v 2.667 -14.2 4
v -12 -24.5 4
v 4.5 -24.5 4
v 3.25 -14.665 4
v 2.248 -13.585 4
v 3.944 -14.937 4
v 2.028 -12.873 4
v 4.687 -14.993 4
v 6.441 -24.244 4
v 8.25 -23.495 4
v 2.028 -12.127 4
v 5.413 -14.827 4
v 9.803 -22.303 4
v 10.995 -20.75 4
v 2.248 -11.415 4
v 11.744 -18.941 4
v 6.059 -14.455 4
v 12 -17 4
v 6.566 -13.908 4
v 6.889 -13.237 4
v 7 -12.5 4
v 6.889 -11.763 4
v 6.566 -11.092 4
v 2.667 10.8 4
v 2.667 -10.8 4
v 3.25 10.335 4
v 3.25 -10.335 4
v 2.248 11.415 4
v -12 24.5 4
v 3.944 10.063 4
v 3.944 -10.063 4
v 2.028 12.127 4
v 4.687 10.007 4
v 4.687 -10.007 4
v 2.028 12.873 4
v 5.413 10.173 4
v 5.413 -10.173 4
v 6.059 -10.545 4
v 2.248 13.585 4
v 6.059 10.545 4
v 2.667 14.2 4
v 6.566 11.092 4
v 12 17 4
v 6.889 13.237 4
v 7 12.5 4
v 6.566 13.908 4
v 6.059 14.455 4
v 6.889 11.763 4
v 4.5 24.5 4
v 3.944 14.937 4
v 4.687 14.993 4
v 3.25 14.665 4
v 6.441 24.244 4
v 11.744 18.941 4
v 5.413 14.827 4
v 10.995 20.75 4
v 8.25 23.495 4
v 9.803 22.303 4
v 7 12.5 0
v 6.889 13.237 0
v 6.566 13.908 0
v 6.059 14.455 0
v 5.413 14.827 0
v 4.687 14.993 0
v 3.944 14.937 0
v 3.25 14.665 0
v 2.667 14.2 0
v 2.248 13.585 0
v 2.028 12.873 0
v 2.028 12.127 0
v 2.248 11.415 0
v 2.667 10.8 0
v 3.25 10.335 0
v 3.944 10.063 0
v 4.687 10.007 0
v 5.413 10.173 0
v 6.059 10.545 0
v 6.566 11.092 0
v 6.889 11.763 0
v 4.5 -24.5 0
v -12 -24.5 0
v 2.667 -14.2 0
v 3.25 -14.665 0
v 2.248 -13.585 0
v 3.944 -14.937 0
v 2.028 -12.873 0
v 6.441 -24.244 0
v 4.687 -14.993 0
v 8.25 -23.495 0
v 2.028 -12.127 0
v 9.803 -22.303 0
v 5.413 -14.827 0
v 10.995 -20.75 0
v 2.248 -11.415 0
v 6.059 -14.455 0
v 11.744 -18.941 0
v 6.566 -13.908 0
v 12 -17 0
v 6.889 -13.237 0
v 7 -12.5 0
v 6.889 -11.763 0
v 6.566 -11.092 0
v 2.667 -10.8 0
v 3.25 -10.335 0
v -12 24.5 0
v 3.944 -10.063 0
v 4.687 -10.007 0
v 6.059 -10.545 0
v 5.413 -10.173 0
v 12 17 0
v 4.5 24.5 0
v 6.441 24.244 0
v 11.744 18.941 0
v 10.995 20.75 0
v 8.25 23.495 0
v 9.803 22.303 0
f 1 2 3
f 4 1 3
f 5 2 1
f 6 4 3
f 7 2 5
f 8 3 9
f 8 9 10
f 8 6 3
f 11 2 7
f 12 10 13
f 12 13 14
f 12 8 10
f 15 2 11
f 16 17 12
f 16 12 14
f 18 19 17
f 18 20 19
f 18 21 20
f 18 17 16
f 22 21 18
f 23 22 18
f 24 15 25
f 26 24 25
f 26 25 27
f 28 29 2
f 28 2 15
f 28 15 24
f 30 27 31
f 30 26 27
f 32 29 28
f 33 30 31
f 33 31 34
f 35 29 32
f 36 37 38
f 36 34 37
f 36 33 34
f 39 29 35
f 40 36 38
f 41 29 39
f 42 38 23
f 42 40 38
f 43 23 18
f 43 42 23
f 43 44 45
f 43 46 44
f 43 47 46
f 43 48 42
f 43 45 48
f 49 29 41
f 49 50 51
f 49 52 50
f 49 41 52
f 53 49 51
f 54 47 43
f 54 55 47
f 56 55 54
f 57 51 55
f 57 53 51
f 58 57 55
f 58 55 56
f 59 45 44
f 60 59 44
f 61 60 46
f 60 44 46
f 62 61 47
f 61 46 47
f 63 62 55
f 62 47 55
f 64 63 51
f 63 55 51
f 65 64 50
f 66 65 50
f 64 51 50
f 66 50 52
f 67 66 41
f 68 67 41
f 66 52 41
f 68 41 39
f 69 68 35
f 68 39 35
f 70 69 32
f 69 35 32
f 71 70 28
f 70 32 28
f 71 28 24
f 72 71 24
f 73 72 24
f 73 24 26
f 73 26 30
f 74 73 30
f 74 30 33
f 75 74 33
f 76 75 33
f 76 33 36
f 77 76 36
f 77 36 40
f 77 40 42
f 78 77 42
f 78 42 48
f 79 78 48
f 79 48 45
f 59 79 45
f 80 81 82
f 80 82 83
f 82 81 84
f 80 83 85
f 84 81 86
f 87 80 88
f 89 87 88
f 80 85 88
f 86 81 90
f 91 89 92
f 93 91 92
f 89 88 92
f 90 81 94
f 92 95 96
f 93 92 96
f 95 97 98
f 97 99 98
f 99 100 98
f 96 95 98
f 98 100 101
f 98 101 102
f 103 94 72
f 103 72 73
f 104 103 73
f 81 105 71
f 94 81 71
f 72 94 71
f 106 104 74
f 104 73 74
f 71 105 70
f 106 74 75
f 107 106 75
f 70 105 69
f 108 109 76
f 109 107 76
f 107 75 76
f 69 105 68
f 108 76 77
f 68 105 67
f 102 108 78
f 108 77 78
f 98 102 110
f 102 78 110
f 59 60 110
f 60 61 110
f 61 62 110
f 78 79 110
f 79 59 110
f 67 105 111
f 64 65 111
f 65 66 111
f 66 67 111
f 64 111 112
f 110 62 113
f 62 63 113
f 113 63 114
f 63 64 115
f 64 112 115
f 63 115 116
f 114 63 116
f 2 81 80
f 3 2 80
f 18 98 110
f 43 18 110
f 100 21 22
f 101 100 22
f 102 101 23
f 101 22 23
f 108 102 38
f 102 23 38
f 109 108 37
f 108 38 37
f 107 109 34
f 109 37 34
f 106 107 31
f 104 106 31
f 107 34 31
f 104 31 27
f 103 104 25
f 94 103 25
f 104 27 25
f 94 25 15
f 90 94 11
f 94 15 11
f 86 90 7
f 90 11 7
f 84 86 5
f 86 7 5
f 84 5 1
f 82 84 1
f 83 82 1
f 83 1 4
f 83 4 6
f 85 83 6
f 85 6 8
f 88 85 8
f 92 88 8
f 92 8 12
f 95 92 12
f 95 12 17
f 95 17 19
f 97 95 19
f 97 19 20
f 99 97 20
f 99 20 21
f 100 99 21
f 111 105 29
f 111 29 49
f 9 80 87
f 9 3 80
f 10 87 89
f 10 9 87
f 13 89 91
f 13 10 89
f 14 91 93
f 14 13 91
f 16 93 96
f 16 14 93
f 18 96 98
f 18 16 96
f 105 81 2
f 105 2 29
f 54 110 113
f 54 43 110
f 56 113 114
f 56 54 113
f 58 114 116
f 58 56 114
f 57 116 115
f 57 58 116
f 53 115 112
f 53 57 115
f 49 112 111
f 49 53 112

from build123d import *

# Parameters (mm, degrees)
F0_W     = 24
F0_H     = 49
F1_DEPTH = 4
F2_R     = 7.5
F3_R     = 2.5
F4_DEPTH = 5


with BuildPart() as f1:
    # F0 (on Top) → F1 (new body)
    with BuildSketch(Plane.XY):
        Rectangle(F0_W, F0_H)
    extrude(amount=F1_DEPTH)

    # F2
    f2_edges = [f1.edges().sort_by_distance(p)[0] for p in [
        (12, -24.5, 2),
        (12, 24.5, 2),
    ]]
    fillet(f2_edges, radius=F2_R)

    # F3 (on face) → F4 (cut)
    with BuildSketch(Plane.XY.offset(4)):
        with Locations((4.5, 12.5)):
            Circle(F3_R)
        with Locations((4.5, -12.5)):
            Circle(F3_R)
    extrude(amount=-F4_DEPTH, mode=Mode.SUBTRACT)


solid = f1.part
